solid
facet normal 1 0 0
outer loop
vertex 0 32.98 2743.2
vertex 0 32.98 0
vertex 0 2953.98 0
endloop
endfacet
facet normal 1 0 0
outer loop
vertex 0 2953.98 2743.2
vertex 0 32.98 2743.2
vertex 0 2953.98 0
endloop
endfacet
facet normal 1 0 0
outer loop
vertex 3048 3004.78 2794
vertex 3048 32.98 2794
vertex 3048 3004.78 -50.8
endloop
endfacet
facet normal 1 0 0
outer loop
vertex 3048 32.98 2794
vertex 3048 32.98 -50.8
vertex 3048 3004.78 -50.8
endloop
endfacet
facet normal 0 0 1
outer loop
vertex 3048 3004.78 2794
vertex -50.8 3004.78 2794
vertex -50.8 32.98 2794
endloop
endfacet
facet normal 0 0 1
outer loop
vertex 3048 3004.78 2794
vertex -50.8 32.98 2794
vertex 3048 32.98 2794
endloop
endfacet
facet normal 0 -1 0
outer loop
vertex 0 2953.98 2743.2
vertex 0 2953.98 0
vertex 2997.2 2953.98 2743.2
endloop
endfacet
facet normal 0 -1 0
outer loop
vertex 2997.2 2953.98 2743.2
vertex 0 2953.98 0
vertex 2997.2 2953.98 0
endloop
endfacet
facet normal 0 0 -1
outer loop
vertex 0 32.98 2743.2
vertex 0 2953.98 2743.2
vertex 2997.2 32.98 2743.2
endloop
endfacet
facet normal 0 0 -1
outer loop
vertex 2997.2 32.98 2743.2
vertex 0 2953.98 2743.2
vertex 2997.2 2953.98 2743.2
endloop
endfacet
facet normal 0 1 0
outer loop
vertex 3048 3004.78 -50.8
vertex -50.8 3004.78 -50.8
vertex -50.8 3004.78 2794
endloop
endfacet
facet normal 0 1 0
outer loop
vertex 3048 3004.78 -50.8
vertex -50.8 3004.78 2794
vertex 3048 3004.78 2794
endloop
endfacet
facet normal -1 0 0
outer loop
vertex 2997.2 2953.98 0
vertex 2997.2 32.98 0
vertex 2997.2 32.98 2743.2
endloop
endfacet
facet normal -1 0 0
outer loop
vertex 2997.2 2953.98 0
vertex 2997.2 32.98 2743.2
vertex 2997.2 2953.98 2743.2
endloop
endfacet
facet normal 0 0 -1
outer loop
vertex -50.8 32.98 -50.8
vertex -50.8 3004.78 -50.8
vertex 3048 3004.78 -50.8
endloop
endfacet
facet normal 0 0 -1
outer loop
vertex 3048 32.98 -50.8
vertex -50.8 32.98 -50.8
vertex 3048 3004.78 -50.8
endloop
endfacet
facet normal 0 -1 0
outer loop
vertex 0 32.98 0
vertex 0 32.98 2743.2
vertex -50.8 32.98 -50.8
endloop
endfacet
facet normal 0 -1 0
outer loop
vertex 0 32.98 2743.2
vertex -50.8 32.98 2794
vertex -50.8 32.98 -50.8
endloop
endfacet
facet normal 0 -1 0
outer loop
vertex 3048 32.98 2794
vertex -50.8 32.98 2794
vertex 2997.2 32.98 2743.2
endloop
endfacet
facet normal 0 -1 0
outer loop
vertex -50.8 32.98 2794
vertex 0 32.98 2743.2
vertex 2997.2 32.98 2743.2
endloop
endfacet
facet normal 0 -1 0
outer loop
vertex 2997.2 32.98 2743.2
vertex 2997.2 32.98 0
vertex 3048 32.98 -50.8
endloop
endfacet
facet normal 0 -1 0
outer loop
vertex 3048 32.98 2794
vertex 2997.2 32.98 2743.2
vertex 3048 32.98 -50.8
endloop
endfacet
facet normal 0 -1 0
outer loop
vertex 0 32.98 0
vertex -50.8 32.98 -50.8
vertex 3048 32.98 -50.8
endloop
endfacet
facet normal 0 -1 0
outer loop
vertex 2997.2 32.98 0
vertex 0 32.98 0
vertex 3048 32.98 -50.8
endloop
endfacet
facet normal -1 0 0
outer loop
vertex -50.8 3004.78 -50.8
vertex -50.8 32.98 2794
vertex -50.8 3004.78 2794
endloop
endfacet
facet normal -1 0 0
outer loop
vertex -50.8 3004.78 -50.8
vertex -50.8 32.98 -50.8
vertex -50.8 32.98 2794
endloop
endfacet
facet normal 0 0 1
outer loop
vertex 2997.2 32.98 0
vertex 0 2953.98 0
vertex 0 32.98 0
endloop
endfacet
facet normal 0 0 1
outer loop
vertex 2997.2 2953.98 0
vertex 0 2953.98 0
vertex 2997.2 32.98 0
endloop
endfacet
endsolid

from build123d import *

# Parameters (mm, degrees)
F0_W     = 2997.2
F0_H     = 2921
F1_DEPTH = 2743.2
F2_T     = 50.8


with BuildPart() as f1:
    # F0 (on Top) → F1 (new body)
    with BuildSketch(Plane.XY):
        with Locations((1498.6, 1493.479801953)):
            Rectangle(F0_W, F0_H)
    extrude(amount=F1_DEPTH)

    # F2
    f2_openings = [f1.faces().sort_by_distance(p)[0] for p in [
        (1498.6, 32.979802, 1371.6),
    ]]
    offset(amount=F2_T, openings=f2_openings, kind=Kind.INTERSECTION)


solid = f1.part
